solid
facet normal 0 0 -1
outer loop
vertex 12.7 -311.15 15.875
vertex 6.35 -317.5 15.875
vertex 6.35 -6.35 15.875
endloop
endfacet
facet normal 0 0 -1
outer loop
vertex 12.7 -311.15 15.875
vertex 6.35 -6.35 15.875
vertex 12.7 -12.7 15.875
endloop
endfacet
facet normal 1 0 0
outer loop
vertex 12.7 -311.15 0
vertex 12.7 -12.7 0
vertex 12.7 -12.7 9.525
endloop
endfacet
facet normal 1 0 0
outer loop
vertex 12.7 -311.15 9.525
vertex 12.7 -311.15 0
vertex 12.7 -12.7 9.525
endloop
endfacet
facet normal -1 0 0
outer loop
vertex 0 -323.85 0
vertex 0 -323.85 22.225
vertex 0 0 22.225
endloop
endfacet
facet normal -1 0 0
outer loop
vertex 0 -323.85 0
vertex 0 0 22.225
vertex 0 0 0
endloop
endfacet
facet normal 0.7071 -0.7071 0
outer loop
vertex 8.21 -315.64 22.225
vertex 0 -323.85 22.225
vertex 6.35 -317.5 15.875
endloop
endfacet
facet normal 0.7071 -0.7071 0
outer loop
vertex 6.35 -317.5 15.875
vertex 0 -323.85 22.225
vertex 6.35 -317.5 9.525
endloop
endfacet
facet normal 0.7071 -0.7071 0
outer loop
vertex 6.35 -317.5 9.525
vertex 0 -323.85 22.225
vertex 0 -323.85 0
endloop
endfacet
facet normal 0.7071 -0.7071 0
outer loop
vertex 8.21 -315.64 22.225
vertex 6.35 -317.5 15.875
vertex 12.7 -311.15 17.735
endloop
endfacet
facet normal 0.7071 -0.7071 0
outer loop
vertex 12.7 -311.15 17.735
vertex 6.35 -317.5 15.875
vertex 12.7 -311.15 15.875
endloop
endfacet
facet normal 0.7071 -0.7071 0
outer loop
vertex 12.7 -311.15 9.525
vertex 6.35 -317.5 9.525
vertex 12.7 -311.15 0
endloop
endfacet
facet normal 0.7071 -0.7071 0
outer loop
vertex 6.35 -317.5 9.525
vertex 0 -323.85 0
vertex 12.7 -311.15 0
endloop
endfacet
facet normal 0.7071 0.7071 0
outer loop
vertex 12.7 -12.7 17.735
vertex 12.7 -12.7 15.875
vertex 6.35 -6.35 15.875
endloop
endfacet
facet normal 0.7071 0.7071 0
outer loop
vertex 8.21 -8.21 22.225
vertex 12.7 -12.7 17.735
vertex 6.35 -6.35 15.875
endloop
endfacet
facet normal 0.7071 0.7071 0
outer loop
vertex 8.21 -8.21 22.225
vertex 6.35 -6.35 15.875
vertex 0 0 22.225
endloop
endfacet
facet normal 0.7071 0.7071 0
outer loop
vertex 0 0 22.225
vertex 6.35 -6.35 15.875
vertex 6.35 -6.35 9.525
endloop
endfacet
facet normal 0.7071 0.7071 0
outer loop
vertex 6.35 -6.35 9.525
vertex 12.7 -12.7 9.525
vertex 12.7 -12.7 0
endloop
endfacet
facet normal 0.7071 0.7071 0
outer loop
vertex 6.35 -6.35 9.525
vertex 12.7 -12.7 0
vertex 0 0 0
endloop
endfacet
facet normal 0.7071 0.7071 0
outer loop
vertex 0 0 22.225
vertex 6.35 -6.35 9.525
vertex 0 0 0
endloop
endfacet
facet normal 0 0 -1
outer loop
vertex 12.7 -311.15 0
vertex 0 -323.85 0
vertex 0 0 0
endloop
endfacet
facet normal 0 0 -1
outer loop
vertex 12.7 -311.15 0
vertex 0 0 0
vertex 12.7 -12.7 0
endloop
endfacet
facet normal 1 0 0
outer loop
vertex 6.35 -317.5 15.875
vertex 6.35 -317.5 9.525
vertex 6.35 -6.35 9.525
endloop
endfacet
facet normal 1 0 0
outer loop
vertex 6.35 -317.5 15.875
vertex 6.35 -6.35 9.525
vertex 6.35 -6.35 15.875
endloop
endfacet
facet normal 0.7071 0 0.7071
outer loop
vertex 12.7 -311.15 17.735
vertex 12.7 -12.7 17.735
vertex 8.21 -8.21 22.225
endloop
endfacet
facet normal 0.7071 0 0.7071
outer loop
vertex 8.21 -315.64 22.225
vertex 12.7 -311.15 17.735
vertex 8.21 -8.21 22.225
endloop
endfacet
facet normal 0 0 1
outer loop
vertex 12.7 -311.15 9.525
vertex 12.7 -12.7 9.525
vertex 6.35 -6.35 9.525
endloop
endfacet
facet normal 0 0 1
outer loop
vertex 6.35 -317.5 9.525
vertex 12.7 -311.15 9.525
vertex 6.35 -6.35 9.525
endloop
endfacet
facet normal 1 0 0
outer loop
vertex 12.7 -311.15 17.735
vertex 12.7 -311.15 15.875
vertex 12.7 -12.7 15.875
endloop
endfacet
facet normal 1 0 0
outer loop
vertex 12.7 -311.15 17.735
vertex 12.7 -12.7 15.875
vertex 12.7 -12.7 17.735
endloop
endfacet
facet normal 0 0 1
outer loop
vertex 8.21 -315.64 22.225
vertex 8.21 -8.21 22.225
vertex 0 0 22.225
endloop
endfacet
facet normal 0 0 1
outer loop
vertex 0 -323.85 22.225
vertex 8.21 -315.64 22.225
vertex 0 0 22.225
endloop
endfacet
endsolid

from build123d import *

# Parameters (mm, degrees)
F1_DEPTH = 323.85
F3_DEPTH = 22.226


with BuildPart() as f1:
    # F0 (on Front) → F1 (new body)
    with BuildSketch(Plane.XZ):
        Polygon((0, 22.225), (0, 0), (12.7, 0), (12.7, 9.525), (6.35, 9.525), (6.35, 15.875), (12.7, 15.875), (12.7, 17.734872), (8.209872, 22.225), align=None)
    extrude(amount=F1_DEPTH)

    # F2 (on face) → F3 (cut, through all)
    with BuildSketch(Plane(origin=(0, 0, 0), x_dir=(1, 0, 0), z_dir=(0, 0, -1))):
        Polygon((12.7, 323.85), (0, 323.85), (12.7, 311.15), align=None)
        Polygon((12.7, 12.7), (0, 0), (12.7, 0), align=None)
    extrude(amount=-F3_DEPTH, mode=Mode.SUBTRACT)


solid = f1.part
